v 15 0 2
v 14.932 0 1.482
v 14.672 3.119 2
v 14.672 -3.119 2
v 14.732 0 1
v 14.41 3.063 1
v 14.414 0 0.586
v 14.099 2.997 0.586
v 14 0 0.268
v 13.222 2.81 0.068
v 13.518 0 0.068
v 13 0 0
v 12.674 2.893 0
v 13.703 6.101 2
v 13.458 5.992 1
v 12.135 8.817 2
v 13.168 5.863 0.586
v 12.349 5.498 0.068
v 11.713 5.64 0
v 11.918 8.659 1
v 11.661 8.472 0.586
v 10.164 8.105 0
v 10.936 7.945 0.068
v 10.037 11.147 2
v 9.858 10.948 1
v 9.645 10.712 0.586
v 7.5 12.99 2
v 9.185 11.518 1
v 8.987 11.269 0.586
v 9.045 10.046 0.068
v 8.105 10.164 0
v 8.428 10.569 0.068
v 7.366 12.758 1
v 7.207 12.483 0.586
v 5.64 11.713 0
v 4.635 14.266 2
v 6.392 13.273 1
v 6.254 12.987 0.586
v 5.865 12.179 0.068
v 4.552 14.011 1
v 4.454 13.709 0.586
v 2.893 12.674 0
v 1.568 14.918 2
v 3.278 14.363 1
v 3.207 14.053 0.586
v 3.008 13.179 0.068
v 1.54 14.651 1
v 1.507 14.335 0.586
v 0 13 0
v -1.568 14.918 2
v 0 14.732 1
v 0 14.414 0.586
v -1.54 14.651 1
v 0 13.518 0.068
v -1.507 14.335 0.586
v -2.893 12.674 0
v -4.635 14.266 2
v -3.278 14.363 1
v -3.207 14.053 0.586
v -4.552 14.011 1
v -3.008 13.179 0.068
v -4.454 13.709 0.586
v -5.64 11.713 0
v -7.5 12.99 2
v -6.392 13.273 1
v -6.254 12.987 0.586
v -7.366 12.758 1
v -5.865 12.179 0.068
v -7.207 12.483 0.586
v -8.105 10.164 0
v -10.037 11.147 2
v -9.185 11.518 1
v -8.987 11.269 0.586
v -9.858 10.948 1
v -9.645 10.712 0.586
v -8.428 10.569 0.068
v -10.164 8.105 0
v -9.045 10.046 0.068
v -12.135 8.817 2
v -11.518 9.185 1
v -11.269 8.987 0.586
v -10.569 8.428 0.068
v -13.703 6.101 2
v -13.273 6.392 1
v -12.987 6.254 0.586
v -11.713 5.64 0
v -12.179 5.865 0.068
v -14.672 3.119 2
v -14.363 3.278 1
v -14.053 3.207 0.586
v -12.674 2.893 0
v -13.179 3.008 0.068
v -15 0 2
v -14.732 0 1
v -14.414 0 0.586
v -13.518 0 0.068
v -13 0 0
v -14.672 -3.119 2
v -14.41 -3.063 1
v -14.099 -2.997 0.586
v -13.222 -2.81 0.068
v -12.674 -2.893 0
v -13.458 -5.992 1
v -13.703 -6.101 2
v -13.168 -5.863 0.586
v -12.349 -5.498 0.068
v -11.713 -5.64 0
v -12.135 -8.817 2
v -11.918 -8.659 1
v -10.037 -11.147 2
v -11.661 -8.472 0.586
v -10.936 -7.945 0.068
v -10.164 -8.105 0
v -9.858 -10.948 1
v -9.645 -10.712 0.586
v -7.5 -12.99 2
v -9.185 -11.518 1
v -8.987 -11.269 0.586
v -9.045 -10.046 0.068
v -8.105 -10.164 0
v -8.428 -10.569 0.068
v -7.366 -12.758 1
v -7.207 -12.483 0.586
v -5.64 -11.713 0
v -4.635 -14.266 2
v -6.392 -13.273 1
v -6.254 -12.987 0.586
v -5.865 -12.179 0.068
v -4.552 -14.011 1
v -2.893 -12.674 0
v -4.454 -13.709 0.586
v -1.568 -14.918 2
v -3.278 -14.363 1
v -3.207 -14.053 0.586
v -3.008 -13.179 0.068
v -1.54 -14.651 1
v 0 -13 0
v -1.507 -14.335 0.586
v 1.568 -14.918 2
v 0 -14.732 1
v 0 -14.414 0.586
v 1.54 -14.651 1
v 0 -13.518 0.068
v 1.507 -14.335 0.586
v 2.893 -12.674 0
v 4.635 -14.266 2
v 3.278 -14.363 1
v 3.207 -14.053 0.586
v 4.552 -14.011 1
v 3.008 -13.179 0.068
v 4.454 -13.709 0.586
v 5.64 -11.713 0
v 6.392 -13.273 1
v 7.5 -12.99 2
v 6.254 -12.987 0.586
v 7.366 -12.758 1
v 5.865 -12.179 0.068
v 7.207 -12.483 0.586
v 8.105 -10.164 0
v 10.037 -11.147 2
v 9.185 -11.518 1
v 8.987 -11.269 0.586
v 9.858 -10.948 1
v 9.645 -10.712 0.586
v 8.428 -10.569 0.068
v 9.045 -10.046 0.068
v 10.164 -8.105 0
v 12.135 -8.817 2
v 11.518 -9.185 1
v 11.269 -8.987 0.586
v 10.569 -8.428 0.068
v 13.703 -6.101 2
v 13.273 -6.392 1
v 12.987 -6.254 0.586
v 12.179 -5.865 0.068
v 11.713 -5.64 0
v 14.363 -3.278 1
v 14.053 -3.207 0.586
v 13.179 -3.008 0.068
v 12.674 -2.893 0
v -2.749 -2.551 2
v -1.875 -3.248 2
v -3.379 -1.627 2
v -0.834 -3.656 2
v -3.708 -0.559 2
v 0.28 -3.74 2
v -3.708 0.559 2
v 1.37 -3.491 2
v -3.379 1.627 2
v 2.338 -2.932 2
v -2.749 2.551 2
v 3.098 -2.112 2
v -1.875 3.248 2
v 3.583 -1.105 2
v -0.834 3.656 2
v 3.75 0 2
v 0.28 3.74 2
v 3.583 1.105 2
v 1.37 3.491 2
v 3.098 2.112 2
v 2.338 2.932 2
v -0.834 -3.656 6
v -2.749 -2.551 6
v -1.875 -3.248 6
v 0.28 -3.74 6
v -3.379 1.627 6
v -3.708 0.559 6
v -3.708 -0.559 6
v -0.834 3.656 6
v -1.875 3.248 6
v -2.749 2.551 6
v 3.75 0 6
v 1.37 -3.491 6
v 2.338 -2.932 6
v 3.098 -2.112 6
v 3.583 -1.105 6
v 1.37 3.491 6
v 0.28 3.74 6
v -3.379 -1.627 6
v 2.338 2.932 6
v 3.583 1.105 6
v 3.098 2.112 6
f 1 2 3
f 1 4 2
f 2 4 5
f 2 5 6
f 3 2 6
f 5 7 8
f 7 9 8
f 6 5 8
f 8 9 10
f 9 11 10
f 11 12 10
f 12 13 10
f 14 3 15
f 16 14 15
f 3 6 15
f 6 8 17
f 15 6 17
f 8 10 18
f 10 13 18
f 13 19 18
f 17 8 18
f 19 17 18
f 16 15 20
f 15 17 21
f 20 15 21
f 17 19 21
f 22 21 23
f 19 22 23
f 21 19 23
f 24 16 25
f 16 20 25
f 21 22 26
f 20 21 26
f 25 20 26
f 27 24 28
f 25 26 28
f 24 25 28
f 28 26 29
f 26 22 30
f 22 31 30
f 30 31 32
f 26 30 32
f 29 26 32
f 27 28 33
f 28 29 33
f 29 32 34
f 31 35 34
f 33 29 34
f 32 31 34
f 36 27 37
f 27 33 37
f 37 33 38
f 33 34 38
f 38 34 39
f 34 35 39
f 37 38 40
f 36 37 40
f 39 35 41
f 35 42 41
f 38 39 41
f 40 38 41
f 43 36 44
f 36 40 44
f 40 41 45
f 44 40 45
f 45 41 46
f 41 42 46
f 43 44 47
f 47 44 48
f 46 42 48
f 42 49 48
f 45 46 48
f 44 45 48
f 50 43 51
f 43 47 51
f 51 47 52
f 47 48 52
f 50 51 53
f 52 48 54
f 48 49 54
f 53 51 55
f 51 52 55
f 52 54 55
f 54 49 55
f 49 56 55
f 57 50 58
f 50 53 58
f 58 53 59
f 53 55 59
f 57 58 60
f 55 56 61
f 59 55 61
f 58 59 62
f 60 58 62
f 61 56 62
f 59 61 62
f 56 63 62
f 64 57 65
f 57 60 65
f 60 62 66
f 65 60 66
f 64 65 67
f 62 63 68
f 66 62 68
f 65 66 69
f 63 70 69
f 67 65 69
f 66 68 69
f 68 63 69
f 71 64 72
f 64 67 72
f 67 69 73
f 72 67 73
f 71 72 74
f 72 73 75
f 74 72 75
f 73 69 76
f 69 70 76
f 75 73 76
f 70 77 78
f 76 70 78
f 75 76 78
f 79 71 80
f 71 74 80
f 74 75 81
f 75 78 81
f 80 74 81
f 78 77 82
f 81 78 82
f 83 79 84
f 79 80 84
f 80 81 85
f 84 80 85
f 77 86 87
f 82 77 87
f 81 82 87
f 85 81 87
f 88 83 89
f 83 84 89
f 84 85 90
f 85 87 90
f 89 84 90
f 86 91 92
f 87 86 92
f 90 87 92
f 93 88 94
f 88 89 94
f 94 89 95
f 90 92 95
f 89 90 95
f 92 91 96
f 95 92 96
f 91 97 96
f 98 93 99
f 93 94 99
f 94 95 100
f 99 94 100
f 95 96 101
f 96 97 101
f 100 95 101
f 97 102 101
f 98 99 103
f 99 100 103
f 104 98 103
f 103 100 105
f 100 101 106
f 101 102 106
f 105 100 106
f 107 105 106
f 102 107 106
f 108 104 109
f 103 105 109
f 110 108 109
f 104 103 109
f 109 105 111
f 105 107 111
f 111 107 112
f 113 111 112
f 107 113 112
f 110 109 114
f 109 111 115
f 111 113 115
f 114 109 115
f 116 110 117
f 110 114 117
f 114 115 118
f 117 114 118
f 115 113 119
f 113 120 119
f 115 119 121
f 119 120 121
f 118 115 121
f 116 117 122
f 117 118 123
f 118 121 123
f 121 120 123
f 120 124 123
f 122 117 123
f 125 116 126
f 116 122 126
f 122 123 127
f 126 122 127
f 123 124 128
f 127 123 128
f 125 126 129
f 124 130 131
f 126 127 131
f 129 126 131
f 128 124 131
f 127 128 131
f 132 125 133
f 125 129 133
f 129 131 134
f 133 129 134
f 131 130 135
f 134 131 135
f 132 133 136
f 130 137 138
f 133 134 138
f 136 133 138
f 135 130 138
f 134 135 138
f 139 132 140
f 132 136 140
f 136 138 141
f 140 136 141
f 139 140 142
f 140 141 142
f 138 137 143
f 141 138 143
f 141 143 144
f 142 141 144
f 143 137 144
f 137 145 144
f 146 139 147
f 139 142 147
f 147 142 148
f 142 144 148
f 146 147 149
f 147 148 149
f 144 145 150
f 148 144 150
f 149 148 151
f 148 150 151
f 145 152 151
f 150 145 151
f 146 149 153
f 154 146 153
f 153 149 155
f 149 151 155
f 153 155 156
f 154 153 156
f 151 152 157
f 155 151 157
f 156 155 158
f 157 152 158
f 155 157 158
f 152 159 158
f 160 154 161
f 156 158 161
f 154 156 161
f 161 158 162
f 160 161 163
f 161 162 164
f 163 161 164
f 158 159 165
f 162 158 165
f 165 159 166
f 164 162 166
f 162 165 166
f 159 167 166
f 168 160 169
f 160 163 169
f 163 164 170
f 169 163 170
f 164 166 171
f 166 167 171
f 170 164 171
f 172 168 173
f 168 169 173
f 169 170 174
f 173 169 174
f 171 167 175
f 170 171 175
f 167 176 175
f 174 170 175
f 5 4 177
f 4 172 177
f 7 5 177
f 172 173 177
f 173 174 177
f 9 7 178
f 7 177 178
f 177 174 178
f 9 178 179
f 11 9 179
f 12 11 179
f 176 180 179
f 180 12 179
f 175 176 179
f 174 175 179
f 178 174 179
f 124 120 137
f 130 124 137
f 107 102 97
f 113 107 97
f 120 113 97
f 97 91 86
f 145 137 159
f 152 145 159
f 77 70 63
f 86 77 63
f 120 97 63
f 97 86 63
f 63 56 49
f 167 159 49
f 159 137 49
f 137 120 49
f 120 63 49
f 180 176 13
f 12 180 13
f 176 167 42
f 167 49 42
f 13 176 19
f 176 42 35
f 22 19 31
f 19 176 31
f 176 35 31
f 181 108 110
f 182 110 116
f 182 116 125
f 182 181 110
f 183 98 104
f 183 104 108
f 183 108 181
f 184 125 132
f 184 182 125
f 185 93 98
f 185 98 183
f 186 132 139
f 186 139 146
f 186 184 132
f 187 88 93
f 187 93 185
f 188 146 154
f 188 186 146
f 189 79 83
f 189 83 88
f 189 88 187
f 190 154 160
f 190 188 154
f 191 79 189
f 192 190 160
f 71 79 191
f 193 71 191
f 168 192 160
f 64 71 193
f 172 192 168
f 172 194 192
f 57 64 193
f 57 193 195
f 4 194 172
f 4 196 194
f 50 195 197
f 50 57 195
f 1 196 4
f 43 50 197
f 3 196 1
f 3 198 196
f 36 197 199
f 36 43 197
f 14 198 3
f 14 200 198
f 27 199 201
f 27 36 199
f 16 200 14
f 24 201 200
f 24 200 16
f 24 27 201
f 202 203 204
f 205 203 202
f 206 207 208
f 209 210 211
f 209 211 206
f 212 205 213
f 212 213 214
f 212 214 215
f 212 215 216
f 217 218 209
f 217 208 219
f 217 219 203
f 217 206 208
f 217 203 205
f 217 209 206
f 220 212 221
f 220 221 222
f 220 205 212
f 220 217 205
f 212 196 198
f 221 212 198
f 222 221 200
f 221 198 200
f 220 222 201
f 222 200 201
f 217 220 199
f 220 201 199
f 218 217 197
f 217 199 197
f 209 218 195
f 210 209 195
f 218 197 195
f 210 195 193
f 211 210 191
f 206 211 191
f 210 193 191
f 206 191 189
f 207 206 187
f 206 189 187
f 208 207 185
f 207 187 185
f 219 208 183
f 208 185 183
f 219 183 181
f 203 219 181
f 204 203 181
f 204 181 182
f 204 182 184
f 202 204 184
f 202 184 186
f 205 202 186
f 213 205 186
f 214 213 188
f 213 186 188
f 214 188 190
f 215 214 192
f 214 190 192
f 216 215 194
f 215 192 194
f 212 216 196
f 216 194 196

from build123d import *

# Parameters (mm, degrees)
F0_R     = 15
F0_R_2   = 3.75
F1_DEPTH = 2
F2_R     = 3.75
F3_DEPTH = 4
F4_R     = 1.99999


# Not quite as in the source:
# - a fillet or chamfer is up to 0.001 mm smaller than in the source, because OpenCascade refuses the exact size


with BuildPart() as f1:
    # F0 (on Top) → F1 (new body)
    with BuildSketch(Plane.XY):
        Circle(F0_R)
        Circle(F0_R_2, mode=Mode.SUBTRACT)
        Circle(F0_R_2)
    extrude(amount=F1_DEPTH)

    # F2 (on face) → F3 (join)
    with BuildSketch(Plane.XY.offset(2)):
        Circle(F2_R)
    extrude(amount=F3_DEPTH)

    # F4 (radius 2 in the source; OpenCascade refuses exactly that, so slightly less here)
    f4_edges = [f1.edges().sort_by_distance(p)[0] for p in [
        (-15, 0, 0),
    ]]
    fillet(f4_edges, radius=F4_R)


solid = f1.part
